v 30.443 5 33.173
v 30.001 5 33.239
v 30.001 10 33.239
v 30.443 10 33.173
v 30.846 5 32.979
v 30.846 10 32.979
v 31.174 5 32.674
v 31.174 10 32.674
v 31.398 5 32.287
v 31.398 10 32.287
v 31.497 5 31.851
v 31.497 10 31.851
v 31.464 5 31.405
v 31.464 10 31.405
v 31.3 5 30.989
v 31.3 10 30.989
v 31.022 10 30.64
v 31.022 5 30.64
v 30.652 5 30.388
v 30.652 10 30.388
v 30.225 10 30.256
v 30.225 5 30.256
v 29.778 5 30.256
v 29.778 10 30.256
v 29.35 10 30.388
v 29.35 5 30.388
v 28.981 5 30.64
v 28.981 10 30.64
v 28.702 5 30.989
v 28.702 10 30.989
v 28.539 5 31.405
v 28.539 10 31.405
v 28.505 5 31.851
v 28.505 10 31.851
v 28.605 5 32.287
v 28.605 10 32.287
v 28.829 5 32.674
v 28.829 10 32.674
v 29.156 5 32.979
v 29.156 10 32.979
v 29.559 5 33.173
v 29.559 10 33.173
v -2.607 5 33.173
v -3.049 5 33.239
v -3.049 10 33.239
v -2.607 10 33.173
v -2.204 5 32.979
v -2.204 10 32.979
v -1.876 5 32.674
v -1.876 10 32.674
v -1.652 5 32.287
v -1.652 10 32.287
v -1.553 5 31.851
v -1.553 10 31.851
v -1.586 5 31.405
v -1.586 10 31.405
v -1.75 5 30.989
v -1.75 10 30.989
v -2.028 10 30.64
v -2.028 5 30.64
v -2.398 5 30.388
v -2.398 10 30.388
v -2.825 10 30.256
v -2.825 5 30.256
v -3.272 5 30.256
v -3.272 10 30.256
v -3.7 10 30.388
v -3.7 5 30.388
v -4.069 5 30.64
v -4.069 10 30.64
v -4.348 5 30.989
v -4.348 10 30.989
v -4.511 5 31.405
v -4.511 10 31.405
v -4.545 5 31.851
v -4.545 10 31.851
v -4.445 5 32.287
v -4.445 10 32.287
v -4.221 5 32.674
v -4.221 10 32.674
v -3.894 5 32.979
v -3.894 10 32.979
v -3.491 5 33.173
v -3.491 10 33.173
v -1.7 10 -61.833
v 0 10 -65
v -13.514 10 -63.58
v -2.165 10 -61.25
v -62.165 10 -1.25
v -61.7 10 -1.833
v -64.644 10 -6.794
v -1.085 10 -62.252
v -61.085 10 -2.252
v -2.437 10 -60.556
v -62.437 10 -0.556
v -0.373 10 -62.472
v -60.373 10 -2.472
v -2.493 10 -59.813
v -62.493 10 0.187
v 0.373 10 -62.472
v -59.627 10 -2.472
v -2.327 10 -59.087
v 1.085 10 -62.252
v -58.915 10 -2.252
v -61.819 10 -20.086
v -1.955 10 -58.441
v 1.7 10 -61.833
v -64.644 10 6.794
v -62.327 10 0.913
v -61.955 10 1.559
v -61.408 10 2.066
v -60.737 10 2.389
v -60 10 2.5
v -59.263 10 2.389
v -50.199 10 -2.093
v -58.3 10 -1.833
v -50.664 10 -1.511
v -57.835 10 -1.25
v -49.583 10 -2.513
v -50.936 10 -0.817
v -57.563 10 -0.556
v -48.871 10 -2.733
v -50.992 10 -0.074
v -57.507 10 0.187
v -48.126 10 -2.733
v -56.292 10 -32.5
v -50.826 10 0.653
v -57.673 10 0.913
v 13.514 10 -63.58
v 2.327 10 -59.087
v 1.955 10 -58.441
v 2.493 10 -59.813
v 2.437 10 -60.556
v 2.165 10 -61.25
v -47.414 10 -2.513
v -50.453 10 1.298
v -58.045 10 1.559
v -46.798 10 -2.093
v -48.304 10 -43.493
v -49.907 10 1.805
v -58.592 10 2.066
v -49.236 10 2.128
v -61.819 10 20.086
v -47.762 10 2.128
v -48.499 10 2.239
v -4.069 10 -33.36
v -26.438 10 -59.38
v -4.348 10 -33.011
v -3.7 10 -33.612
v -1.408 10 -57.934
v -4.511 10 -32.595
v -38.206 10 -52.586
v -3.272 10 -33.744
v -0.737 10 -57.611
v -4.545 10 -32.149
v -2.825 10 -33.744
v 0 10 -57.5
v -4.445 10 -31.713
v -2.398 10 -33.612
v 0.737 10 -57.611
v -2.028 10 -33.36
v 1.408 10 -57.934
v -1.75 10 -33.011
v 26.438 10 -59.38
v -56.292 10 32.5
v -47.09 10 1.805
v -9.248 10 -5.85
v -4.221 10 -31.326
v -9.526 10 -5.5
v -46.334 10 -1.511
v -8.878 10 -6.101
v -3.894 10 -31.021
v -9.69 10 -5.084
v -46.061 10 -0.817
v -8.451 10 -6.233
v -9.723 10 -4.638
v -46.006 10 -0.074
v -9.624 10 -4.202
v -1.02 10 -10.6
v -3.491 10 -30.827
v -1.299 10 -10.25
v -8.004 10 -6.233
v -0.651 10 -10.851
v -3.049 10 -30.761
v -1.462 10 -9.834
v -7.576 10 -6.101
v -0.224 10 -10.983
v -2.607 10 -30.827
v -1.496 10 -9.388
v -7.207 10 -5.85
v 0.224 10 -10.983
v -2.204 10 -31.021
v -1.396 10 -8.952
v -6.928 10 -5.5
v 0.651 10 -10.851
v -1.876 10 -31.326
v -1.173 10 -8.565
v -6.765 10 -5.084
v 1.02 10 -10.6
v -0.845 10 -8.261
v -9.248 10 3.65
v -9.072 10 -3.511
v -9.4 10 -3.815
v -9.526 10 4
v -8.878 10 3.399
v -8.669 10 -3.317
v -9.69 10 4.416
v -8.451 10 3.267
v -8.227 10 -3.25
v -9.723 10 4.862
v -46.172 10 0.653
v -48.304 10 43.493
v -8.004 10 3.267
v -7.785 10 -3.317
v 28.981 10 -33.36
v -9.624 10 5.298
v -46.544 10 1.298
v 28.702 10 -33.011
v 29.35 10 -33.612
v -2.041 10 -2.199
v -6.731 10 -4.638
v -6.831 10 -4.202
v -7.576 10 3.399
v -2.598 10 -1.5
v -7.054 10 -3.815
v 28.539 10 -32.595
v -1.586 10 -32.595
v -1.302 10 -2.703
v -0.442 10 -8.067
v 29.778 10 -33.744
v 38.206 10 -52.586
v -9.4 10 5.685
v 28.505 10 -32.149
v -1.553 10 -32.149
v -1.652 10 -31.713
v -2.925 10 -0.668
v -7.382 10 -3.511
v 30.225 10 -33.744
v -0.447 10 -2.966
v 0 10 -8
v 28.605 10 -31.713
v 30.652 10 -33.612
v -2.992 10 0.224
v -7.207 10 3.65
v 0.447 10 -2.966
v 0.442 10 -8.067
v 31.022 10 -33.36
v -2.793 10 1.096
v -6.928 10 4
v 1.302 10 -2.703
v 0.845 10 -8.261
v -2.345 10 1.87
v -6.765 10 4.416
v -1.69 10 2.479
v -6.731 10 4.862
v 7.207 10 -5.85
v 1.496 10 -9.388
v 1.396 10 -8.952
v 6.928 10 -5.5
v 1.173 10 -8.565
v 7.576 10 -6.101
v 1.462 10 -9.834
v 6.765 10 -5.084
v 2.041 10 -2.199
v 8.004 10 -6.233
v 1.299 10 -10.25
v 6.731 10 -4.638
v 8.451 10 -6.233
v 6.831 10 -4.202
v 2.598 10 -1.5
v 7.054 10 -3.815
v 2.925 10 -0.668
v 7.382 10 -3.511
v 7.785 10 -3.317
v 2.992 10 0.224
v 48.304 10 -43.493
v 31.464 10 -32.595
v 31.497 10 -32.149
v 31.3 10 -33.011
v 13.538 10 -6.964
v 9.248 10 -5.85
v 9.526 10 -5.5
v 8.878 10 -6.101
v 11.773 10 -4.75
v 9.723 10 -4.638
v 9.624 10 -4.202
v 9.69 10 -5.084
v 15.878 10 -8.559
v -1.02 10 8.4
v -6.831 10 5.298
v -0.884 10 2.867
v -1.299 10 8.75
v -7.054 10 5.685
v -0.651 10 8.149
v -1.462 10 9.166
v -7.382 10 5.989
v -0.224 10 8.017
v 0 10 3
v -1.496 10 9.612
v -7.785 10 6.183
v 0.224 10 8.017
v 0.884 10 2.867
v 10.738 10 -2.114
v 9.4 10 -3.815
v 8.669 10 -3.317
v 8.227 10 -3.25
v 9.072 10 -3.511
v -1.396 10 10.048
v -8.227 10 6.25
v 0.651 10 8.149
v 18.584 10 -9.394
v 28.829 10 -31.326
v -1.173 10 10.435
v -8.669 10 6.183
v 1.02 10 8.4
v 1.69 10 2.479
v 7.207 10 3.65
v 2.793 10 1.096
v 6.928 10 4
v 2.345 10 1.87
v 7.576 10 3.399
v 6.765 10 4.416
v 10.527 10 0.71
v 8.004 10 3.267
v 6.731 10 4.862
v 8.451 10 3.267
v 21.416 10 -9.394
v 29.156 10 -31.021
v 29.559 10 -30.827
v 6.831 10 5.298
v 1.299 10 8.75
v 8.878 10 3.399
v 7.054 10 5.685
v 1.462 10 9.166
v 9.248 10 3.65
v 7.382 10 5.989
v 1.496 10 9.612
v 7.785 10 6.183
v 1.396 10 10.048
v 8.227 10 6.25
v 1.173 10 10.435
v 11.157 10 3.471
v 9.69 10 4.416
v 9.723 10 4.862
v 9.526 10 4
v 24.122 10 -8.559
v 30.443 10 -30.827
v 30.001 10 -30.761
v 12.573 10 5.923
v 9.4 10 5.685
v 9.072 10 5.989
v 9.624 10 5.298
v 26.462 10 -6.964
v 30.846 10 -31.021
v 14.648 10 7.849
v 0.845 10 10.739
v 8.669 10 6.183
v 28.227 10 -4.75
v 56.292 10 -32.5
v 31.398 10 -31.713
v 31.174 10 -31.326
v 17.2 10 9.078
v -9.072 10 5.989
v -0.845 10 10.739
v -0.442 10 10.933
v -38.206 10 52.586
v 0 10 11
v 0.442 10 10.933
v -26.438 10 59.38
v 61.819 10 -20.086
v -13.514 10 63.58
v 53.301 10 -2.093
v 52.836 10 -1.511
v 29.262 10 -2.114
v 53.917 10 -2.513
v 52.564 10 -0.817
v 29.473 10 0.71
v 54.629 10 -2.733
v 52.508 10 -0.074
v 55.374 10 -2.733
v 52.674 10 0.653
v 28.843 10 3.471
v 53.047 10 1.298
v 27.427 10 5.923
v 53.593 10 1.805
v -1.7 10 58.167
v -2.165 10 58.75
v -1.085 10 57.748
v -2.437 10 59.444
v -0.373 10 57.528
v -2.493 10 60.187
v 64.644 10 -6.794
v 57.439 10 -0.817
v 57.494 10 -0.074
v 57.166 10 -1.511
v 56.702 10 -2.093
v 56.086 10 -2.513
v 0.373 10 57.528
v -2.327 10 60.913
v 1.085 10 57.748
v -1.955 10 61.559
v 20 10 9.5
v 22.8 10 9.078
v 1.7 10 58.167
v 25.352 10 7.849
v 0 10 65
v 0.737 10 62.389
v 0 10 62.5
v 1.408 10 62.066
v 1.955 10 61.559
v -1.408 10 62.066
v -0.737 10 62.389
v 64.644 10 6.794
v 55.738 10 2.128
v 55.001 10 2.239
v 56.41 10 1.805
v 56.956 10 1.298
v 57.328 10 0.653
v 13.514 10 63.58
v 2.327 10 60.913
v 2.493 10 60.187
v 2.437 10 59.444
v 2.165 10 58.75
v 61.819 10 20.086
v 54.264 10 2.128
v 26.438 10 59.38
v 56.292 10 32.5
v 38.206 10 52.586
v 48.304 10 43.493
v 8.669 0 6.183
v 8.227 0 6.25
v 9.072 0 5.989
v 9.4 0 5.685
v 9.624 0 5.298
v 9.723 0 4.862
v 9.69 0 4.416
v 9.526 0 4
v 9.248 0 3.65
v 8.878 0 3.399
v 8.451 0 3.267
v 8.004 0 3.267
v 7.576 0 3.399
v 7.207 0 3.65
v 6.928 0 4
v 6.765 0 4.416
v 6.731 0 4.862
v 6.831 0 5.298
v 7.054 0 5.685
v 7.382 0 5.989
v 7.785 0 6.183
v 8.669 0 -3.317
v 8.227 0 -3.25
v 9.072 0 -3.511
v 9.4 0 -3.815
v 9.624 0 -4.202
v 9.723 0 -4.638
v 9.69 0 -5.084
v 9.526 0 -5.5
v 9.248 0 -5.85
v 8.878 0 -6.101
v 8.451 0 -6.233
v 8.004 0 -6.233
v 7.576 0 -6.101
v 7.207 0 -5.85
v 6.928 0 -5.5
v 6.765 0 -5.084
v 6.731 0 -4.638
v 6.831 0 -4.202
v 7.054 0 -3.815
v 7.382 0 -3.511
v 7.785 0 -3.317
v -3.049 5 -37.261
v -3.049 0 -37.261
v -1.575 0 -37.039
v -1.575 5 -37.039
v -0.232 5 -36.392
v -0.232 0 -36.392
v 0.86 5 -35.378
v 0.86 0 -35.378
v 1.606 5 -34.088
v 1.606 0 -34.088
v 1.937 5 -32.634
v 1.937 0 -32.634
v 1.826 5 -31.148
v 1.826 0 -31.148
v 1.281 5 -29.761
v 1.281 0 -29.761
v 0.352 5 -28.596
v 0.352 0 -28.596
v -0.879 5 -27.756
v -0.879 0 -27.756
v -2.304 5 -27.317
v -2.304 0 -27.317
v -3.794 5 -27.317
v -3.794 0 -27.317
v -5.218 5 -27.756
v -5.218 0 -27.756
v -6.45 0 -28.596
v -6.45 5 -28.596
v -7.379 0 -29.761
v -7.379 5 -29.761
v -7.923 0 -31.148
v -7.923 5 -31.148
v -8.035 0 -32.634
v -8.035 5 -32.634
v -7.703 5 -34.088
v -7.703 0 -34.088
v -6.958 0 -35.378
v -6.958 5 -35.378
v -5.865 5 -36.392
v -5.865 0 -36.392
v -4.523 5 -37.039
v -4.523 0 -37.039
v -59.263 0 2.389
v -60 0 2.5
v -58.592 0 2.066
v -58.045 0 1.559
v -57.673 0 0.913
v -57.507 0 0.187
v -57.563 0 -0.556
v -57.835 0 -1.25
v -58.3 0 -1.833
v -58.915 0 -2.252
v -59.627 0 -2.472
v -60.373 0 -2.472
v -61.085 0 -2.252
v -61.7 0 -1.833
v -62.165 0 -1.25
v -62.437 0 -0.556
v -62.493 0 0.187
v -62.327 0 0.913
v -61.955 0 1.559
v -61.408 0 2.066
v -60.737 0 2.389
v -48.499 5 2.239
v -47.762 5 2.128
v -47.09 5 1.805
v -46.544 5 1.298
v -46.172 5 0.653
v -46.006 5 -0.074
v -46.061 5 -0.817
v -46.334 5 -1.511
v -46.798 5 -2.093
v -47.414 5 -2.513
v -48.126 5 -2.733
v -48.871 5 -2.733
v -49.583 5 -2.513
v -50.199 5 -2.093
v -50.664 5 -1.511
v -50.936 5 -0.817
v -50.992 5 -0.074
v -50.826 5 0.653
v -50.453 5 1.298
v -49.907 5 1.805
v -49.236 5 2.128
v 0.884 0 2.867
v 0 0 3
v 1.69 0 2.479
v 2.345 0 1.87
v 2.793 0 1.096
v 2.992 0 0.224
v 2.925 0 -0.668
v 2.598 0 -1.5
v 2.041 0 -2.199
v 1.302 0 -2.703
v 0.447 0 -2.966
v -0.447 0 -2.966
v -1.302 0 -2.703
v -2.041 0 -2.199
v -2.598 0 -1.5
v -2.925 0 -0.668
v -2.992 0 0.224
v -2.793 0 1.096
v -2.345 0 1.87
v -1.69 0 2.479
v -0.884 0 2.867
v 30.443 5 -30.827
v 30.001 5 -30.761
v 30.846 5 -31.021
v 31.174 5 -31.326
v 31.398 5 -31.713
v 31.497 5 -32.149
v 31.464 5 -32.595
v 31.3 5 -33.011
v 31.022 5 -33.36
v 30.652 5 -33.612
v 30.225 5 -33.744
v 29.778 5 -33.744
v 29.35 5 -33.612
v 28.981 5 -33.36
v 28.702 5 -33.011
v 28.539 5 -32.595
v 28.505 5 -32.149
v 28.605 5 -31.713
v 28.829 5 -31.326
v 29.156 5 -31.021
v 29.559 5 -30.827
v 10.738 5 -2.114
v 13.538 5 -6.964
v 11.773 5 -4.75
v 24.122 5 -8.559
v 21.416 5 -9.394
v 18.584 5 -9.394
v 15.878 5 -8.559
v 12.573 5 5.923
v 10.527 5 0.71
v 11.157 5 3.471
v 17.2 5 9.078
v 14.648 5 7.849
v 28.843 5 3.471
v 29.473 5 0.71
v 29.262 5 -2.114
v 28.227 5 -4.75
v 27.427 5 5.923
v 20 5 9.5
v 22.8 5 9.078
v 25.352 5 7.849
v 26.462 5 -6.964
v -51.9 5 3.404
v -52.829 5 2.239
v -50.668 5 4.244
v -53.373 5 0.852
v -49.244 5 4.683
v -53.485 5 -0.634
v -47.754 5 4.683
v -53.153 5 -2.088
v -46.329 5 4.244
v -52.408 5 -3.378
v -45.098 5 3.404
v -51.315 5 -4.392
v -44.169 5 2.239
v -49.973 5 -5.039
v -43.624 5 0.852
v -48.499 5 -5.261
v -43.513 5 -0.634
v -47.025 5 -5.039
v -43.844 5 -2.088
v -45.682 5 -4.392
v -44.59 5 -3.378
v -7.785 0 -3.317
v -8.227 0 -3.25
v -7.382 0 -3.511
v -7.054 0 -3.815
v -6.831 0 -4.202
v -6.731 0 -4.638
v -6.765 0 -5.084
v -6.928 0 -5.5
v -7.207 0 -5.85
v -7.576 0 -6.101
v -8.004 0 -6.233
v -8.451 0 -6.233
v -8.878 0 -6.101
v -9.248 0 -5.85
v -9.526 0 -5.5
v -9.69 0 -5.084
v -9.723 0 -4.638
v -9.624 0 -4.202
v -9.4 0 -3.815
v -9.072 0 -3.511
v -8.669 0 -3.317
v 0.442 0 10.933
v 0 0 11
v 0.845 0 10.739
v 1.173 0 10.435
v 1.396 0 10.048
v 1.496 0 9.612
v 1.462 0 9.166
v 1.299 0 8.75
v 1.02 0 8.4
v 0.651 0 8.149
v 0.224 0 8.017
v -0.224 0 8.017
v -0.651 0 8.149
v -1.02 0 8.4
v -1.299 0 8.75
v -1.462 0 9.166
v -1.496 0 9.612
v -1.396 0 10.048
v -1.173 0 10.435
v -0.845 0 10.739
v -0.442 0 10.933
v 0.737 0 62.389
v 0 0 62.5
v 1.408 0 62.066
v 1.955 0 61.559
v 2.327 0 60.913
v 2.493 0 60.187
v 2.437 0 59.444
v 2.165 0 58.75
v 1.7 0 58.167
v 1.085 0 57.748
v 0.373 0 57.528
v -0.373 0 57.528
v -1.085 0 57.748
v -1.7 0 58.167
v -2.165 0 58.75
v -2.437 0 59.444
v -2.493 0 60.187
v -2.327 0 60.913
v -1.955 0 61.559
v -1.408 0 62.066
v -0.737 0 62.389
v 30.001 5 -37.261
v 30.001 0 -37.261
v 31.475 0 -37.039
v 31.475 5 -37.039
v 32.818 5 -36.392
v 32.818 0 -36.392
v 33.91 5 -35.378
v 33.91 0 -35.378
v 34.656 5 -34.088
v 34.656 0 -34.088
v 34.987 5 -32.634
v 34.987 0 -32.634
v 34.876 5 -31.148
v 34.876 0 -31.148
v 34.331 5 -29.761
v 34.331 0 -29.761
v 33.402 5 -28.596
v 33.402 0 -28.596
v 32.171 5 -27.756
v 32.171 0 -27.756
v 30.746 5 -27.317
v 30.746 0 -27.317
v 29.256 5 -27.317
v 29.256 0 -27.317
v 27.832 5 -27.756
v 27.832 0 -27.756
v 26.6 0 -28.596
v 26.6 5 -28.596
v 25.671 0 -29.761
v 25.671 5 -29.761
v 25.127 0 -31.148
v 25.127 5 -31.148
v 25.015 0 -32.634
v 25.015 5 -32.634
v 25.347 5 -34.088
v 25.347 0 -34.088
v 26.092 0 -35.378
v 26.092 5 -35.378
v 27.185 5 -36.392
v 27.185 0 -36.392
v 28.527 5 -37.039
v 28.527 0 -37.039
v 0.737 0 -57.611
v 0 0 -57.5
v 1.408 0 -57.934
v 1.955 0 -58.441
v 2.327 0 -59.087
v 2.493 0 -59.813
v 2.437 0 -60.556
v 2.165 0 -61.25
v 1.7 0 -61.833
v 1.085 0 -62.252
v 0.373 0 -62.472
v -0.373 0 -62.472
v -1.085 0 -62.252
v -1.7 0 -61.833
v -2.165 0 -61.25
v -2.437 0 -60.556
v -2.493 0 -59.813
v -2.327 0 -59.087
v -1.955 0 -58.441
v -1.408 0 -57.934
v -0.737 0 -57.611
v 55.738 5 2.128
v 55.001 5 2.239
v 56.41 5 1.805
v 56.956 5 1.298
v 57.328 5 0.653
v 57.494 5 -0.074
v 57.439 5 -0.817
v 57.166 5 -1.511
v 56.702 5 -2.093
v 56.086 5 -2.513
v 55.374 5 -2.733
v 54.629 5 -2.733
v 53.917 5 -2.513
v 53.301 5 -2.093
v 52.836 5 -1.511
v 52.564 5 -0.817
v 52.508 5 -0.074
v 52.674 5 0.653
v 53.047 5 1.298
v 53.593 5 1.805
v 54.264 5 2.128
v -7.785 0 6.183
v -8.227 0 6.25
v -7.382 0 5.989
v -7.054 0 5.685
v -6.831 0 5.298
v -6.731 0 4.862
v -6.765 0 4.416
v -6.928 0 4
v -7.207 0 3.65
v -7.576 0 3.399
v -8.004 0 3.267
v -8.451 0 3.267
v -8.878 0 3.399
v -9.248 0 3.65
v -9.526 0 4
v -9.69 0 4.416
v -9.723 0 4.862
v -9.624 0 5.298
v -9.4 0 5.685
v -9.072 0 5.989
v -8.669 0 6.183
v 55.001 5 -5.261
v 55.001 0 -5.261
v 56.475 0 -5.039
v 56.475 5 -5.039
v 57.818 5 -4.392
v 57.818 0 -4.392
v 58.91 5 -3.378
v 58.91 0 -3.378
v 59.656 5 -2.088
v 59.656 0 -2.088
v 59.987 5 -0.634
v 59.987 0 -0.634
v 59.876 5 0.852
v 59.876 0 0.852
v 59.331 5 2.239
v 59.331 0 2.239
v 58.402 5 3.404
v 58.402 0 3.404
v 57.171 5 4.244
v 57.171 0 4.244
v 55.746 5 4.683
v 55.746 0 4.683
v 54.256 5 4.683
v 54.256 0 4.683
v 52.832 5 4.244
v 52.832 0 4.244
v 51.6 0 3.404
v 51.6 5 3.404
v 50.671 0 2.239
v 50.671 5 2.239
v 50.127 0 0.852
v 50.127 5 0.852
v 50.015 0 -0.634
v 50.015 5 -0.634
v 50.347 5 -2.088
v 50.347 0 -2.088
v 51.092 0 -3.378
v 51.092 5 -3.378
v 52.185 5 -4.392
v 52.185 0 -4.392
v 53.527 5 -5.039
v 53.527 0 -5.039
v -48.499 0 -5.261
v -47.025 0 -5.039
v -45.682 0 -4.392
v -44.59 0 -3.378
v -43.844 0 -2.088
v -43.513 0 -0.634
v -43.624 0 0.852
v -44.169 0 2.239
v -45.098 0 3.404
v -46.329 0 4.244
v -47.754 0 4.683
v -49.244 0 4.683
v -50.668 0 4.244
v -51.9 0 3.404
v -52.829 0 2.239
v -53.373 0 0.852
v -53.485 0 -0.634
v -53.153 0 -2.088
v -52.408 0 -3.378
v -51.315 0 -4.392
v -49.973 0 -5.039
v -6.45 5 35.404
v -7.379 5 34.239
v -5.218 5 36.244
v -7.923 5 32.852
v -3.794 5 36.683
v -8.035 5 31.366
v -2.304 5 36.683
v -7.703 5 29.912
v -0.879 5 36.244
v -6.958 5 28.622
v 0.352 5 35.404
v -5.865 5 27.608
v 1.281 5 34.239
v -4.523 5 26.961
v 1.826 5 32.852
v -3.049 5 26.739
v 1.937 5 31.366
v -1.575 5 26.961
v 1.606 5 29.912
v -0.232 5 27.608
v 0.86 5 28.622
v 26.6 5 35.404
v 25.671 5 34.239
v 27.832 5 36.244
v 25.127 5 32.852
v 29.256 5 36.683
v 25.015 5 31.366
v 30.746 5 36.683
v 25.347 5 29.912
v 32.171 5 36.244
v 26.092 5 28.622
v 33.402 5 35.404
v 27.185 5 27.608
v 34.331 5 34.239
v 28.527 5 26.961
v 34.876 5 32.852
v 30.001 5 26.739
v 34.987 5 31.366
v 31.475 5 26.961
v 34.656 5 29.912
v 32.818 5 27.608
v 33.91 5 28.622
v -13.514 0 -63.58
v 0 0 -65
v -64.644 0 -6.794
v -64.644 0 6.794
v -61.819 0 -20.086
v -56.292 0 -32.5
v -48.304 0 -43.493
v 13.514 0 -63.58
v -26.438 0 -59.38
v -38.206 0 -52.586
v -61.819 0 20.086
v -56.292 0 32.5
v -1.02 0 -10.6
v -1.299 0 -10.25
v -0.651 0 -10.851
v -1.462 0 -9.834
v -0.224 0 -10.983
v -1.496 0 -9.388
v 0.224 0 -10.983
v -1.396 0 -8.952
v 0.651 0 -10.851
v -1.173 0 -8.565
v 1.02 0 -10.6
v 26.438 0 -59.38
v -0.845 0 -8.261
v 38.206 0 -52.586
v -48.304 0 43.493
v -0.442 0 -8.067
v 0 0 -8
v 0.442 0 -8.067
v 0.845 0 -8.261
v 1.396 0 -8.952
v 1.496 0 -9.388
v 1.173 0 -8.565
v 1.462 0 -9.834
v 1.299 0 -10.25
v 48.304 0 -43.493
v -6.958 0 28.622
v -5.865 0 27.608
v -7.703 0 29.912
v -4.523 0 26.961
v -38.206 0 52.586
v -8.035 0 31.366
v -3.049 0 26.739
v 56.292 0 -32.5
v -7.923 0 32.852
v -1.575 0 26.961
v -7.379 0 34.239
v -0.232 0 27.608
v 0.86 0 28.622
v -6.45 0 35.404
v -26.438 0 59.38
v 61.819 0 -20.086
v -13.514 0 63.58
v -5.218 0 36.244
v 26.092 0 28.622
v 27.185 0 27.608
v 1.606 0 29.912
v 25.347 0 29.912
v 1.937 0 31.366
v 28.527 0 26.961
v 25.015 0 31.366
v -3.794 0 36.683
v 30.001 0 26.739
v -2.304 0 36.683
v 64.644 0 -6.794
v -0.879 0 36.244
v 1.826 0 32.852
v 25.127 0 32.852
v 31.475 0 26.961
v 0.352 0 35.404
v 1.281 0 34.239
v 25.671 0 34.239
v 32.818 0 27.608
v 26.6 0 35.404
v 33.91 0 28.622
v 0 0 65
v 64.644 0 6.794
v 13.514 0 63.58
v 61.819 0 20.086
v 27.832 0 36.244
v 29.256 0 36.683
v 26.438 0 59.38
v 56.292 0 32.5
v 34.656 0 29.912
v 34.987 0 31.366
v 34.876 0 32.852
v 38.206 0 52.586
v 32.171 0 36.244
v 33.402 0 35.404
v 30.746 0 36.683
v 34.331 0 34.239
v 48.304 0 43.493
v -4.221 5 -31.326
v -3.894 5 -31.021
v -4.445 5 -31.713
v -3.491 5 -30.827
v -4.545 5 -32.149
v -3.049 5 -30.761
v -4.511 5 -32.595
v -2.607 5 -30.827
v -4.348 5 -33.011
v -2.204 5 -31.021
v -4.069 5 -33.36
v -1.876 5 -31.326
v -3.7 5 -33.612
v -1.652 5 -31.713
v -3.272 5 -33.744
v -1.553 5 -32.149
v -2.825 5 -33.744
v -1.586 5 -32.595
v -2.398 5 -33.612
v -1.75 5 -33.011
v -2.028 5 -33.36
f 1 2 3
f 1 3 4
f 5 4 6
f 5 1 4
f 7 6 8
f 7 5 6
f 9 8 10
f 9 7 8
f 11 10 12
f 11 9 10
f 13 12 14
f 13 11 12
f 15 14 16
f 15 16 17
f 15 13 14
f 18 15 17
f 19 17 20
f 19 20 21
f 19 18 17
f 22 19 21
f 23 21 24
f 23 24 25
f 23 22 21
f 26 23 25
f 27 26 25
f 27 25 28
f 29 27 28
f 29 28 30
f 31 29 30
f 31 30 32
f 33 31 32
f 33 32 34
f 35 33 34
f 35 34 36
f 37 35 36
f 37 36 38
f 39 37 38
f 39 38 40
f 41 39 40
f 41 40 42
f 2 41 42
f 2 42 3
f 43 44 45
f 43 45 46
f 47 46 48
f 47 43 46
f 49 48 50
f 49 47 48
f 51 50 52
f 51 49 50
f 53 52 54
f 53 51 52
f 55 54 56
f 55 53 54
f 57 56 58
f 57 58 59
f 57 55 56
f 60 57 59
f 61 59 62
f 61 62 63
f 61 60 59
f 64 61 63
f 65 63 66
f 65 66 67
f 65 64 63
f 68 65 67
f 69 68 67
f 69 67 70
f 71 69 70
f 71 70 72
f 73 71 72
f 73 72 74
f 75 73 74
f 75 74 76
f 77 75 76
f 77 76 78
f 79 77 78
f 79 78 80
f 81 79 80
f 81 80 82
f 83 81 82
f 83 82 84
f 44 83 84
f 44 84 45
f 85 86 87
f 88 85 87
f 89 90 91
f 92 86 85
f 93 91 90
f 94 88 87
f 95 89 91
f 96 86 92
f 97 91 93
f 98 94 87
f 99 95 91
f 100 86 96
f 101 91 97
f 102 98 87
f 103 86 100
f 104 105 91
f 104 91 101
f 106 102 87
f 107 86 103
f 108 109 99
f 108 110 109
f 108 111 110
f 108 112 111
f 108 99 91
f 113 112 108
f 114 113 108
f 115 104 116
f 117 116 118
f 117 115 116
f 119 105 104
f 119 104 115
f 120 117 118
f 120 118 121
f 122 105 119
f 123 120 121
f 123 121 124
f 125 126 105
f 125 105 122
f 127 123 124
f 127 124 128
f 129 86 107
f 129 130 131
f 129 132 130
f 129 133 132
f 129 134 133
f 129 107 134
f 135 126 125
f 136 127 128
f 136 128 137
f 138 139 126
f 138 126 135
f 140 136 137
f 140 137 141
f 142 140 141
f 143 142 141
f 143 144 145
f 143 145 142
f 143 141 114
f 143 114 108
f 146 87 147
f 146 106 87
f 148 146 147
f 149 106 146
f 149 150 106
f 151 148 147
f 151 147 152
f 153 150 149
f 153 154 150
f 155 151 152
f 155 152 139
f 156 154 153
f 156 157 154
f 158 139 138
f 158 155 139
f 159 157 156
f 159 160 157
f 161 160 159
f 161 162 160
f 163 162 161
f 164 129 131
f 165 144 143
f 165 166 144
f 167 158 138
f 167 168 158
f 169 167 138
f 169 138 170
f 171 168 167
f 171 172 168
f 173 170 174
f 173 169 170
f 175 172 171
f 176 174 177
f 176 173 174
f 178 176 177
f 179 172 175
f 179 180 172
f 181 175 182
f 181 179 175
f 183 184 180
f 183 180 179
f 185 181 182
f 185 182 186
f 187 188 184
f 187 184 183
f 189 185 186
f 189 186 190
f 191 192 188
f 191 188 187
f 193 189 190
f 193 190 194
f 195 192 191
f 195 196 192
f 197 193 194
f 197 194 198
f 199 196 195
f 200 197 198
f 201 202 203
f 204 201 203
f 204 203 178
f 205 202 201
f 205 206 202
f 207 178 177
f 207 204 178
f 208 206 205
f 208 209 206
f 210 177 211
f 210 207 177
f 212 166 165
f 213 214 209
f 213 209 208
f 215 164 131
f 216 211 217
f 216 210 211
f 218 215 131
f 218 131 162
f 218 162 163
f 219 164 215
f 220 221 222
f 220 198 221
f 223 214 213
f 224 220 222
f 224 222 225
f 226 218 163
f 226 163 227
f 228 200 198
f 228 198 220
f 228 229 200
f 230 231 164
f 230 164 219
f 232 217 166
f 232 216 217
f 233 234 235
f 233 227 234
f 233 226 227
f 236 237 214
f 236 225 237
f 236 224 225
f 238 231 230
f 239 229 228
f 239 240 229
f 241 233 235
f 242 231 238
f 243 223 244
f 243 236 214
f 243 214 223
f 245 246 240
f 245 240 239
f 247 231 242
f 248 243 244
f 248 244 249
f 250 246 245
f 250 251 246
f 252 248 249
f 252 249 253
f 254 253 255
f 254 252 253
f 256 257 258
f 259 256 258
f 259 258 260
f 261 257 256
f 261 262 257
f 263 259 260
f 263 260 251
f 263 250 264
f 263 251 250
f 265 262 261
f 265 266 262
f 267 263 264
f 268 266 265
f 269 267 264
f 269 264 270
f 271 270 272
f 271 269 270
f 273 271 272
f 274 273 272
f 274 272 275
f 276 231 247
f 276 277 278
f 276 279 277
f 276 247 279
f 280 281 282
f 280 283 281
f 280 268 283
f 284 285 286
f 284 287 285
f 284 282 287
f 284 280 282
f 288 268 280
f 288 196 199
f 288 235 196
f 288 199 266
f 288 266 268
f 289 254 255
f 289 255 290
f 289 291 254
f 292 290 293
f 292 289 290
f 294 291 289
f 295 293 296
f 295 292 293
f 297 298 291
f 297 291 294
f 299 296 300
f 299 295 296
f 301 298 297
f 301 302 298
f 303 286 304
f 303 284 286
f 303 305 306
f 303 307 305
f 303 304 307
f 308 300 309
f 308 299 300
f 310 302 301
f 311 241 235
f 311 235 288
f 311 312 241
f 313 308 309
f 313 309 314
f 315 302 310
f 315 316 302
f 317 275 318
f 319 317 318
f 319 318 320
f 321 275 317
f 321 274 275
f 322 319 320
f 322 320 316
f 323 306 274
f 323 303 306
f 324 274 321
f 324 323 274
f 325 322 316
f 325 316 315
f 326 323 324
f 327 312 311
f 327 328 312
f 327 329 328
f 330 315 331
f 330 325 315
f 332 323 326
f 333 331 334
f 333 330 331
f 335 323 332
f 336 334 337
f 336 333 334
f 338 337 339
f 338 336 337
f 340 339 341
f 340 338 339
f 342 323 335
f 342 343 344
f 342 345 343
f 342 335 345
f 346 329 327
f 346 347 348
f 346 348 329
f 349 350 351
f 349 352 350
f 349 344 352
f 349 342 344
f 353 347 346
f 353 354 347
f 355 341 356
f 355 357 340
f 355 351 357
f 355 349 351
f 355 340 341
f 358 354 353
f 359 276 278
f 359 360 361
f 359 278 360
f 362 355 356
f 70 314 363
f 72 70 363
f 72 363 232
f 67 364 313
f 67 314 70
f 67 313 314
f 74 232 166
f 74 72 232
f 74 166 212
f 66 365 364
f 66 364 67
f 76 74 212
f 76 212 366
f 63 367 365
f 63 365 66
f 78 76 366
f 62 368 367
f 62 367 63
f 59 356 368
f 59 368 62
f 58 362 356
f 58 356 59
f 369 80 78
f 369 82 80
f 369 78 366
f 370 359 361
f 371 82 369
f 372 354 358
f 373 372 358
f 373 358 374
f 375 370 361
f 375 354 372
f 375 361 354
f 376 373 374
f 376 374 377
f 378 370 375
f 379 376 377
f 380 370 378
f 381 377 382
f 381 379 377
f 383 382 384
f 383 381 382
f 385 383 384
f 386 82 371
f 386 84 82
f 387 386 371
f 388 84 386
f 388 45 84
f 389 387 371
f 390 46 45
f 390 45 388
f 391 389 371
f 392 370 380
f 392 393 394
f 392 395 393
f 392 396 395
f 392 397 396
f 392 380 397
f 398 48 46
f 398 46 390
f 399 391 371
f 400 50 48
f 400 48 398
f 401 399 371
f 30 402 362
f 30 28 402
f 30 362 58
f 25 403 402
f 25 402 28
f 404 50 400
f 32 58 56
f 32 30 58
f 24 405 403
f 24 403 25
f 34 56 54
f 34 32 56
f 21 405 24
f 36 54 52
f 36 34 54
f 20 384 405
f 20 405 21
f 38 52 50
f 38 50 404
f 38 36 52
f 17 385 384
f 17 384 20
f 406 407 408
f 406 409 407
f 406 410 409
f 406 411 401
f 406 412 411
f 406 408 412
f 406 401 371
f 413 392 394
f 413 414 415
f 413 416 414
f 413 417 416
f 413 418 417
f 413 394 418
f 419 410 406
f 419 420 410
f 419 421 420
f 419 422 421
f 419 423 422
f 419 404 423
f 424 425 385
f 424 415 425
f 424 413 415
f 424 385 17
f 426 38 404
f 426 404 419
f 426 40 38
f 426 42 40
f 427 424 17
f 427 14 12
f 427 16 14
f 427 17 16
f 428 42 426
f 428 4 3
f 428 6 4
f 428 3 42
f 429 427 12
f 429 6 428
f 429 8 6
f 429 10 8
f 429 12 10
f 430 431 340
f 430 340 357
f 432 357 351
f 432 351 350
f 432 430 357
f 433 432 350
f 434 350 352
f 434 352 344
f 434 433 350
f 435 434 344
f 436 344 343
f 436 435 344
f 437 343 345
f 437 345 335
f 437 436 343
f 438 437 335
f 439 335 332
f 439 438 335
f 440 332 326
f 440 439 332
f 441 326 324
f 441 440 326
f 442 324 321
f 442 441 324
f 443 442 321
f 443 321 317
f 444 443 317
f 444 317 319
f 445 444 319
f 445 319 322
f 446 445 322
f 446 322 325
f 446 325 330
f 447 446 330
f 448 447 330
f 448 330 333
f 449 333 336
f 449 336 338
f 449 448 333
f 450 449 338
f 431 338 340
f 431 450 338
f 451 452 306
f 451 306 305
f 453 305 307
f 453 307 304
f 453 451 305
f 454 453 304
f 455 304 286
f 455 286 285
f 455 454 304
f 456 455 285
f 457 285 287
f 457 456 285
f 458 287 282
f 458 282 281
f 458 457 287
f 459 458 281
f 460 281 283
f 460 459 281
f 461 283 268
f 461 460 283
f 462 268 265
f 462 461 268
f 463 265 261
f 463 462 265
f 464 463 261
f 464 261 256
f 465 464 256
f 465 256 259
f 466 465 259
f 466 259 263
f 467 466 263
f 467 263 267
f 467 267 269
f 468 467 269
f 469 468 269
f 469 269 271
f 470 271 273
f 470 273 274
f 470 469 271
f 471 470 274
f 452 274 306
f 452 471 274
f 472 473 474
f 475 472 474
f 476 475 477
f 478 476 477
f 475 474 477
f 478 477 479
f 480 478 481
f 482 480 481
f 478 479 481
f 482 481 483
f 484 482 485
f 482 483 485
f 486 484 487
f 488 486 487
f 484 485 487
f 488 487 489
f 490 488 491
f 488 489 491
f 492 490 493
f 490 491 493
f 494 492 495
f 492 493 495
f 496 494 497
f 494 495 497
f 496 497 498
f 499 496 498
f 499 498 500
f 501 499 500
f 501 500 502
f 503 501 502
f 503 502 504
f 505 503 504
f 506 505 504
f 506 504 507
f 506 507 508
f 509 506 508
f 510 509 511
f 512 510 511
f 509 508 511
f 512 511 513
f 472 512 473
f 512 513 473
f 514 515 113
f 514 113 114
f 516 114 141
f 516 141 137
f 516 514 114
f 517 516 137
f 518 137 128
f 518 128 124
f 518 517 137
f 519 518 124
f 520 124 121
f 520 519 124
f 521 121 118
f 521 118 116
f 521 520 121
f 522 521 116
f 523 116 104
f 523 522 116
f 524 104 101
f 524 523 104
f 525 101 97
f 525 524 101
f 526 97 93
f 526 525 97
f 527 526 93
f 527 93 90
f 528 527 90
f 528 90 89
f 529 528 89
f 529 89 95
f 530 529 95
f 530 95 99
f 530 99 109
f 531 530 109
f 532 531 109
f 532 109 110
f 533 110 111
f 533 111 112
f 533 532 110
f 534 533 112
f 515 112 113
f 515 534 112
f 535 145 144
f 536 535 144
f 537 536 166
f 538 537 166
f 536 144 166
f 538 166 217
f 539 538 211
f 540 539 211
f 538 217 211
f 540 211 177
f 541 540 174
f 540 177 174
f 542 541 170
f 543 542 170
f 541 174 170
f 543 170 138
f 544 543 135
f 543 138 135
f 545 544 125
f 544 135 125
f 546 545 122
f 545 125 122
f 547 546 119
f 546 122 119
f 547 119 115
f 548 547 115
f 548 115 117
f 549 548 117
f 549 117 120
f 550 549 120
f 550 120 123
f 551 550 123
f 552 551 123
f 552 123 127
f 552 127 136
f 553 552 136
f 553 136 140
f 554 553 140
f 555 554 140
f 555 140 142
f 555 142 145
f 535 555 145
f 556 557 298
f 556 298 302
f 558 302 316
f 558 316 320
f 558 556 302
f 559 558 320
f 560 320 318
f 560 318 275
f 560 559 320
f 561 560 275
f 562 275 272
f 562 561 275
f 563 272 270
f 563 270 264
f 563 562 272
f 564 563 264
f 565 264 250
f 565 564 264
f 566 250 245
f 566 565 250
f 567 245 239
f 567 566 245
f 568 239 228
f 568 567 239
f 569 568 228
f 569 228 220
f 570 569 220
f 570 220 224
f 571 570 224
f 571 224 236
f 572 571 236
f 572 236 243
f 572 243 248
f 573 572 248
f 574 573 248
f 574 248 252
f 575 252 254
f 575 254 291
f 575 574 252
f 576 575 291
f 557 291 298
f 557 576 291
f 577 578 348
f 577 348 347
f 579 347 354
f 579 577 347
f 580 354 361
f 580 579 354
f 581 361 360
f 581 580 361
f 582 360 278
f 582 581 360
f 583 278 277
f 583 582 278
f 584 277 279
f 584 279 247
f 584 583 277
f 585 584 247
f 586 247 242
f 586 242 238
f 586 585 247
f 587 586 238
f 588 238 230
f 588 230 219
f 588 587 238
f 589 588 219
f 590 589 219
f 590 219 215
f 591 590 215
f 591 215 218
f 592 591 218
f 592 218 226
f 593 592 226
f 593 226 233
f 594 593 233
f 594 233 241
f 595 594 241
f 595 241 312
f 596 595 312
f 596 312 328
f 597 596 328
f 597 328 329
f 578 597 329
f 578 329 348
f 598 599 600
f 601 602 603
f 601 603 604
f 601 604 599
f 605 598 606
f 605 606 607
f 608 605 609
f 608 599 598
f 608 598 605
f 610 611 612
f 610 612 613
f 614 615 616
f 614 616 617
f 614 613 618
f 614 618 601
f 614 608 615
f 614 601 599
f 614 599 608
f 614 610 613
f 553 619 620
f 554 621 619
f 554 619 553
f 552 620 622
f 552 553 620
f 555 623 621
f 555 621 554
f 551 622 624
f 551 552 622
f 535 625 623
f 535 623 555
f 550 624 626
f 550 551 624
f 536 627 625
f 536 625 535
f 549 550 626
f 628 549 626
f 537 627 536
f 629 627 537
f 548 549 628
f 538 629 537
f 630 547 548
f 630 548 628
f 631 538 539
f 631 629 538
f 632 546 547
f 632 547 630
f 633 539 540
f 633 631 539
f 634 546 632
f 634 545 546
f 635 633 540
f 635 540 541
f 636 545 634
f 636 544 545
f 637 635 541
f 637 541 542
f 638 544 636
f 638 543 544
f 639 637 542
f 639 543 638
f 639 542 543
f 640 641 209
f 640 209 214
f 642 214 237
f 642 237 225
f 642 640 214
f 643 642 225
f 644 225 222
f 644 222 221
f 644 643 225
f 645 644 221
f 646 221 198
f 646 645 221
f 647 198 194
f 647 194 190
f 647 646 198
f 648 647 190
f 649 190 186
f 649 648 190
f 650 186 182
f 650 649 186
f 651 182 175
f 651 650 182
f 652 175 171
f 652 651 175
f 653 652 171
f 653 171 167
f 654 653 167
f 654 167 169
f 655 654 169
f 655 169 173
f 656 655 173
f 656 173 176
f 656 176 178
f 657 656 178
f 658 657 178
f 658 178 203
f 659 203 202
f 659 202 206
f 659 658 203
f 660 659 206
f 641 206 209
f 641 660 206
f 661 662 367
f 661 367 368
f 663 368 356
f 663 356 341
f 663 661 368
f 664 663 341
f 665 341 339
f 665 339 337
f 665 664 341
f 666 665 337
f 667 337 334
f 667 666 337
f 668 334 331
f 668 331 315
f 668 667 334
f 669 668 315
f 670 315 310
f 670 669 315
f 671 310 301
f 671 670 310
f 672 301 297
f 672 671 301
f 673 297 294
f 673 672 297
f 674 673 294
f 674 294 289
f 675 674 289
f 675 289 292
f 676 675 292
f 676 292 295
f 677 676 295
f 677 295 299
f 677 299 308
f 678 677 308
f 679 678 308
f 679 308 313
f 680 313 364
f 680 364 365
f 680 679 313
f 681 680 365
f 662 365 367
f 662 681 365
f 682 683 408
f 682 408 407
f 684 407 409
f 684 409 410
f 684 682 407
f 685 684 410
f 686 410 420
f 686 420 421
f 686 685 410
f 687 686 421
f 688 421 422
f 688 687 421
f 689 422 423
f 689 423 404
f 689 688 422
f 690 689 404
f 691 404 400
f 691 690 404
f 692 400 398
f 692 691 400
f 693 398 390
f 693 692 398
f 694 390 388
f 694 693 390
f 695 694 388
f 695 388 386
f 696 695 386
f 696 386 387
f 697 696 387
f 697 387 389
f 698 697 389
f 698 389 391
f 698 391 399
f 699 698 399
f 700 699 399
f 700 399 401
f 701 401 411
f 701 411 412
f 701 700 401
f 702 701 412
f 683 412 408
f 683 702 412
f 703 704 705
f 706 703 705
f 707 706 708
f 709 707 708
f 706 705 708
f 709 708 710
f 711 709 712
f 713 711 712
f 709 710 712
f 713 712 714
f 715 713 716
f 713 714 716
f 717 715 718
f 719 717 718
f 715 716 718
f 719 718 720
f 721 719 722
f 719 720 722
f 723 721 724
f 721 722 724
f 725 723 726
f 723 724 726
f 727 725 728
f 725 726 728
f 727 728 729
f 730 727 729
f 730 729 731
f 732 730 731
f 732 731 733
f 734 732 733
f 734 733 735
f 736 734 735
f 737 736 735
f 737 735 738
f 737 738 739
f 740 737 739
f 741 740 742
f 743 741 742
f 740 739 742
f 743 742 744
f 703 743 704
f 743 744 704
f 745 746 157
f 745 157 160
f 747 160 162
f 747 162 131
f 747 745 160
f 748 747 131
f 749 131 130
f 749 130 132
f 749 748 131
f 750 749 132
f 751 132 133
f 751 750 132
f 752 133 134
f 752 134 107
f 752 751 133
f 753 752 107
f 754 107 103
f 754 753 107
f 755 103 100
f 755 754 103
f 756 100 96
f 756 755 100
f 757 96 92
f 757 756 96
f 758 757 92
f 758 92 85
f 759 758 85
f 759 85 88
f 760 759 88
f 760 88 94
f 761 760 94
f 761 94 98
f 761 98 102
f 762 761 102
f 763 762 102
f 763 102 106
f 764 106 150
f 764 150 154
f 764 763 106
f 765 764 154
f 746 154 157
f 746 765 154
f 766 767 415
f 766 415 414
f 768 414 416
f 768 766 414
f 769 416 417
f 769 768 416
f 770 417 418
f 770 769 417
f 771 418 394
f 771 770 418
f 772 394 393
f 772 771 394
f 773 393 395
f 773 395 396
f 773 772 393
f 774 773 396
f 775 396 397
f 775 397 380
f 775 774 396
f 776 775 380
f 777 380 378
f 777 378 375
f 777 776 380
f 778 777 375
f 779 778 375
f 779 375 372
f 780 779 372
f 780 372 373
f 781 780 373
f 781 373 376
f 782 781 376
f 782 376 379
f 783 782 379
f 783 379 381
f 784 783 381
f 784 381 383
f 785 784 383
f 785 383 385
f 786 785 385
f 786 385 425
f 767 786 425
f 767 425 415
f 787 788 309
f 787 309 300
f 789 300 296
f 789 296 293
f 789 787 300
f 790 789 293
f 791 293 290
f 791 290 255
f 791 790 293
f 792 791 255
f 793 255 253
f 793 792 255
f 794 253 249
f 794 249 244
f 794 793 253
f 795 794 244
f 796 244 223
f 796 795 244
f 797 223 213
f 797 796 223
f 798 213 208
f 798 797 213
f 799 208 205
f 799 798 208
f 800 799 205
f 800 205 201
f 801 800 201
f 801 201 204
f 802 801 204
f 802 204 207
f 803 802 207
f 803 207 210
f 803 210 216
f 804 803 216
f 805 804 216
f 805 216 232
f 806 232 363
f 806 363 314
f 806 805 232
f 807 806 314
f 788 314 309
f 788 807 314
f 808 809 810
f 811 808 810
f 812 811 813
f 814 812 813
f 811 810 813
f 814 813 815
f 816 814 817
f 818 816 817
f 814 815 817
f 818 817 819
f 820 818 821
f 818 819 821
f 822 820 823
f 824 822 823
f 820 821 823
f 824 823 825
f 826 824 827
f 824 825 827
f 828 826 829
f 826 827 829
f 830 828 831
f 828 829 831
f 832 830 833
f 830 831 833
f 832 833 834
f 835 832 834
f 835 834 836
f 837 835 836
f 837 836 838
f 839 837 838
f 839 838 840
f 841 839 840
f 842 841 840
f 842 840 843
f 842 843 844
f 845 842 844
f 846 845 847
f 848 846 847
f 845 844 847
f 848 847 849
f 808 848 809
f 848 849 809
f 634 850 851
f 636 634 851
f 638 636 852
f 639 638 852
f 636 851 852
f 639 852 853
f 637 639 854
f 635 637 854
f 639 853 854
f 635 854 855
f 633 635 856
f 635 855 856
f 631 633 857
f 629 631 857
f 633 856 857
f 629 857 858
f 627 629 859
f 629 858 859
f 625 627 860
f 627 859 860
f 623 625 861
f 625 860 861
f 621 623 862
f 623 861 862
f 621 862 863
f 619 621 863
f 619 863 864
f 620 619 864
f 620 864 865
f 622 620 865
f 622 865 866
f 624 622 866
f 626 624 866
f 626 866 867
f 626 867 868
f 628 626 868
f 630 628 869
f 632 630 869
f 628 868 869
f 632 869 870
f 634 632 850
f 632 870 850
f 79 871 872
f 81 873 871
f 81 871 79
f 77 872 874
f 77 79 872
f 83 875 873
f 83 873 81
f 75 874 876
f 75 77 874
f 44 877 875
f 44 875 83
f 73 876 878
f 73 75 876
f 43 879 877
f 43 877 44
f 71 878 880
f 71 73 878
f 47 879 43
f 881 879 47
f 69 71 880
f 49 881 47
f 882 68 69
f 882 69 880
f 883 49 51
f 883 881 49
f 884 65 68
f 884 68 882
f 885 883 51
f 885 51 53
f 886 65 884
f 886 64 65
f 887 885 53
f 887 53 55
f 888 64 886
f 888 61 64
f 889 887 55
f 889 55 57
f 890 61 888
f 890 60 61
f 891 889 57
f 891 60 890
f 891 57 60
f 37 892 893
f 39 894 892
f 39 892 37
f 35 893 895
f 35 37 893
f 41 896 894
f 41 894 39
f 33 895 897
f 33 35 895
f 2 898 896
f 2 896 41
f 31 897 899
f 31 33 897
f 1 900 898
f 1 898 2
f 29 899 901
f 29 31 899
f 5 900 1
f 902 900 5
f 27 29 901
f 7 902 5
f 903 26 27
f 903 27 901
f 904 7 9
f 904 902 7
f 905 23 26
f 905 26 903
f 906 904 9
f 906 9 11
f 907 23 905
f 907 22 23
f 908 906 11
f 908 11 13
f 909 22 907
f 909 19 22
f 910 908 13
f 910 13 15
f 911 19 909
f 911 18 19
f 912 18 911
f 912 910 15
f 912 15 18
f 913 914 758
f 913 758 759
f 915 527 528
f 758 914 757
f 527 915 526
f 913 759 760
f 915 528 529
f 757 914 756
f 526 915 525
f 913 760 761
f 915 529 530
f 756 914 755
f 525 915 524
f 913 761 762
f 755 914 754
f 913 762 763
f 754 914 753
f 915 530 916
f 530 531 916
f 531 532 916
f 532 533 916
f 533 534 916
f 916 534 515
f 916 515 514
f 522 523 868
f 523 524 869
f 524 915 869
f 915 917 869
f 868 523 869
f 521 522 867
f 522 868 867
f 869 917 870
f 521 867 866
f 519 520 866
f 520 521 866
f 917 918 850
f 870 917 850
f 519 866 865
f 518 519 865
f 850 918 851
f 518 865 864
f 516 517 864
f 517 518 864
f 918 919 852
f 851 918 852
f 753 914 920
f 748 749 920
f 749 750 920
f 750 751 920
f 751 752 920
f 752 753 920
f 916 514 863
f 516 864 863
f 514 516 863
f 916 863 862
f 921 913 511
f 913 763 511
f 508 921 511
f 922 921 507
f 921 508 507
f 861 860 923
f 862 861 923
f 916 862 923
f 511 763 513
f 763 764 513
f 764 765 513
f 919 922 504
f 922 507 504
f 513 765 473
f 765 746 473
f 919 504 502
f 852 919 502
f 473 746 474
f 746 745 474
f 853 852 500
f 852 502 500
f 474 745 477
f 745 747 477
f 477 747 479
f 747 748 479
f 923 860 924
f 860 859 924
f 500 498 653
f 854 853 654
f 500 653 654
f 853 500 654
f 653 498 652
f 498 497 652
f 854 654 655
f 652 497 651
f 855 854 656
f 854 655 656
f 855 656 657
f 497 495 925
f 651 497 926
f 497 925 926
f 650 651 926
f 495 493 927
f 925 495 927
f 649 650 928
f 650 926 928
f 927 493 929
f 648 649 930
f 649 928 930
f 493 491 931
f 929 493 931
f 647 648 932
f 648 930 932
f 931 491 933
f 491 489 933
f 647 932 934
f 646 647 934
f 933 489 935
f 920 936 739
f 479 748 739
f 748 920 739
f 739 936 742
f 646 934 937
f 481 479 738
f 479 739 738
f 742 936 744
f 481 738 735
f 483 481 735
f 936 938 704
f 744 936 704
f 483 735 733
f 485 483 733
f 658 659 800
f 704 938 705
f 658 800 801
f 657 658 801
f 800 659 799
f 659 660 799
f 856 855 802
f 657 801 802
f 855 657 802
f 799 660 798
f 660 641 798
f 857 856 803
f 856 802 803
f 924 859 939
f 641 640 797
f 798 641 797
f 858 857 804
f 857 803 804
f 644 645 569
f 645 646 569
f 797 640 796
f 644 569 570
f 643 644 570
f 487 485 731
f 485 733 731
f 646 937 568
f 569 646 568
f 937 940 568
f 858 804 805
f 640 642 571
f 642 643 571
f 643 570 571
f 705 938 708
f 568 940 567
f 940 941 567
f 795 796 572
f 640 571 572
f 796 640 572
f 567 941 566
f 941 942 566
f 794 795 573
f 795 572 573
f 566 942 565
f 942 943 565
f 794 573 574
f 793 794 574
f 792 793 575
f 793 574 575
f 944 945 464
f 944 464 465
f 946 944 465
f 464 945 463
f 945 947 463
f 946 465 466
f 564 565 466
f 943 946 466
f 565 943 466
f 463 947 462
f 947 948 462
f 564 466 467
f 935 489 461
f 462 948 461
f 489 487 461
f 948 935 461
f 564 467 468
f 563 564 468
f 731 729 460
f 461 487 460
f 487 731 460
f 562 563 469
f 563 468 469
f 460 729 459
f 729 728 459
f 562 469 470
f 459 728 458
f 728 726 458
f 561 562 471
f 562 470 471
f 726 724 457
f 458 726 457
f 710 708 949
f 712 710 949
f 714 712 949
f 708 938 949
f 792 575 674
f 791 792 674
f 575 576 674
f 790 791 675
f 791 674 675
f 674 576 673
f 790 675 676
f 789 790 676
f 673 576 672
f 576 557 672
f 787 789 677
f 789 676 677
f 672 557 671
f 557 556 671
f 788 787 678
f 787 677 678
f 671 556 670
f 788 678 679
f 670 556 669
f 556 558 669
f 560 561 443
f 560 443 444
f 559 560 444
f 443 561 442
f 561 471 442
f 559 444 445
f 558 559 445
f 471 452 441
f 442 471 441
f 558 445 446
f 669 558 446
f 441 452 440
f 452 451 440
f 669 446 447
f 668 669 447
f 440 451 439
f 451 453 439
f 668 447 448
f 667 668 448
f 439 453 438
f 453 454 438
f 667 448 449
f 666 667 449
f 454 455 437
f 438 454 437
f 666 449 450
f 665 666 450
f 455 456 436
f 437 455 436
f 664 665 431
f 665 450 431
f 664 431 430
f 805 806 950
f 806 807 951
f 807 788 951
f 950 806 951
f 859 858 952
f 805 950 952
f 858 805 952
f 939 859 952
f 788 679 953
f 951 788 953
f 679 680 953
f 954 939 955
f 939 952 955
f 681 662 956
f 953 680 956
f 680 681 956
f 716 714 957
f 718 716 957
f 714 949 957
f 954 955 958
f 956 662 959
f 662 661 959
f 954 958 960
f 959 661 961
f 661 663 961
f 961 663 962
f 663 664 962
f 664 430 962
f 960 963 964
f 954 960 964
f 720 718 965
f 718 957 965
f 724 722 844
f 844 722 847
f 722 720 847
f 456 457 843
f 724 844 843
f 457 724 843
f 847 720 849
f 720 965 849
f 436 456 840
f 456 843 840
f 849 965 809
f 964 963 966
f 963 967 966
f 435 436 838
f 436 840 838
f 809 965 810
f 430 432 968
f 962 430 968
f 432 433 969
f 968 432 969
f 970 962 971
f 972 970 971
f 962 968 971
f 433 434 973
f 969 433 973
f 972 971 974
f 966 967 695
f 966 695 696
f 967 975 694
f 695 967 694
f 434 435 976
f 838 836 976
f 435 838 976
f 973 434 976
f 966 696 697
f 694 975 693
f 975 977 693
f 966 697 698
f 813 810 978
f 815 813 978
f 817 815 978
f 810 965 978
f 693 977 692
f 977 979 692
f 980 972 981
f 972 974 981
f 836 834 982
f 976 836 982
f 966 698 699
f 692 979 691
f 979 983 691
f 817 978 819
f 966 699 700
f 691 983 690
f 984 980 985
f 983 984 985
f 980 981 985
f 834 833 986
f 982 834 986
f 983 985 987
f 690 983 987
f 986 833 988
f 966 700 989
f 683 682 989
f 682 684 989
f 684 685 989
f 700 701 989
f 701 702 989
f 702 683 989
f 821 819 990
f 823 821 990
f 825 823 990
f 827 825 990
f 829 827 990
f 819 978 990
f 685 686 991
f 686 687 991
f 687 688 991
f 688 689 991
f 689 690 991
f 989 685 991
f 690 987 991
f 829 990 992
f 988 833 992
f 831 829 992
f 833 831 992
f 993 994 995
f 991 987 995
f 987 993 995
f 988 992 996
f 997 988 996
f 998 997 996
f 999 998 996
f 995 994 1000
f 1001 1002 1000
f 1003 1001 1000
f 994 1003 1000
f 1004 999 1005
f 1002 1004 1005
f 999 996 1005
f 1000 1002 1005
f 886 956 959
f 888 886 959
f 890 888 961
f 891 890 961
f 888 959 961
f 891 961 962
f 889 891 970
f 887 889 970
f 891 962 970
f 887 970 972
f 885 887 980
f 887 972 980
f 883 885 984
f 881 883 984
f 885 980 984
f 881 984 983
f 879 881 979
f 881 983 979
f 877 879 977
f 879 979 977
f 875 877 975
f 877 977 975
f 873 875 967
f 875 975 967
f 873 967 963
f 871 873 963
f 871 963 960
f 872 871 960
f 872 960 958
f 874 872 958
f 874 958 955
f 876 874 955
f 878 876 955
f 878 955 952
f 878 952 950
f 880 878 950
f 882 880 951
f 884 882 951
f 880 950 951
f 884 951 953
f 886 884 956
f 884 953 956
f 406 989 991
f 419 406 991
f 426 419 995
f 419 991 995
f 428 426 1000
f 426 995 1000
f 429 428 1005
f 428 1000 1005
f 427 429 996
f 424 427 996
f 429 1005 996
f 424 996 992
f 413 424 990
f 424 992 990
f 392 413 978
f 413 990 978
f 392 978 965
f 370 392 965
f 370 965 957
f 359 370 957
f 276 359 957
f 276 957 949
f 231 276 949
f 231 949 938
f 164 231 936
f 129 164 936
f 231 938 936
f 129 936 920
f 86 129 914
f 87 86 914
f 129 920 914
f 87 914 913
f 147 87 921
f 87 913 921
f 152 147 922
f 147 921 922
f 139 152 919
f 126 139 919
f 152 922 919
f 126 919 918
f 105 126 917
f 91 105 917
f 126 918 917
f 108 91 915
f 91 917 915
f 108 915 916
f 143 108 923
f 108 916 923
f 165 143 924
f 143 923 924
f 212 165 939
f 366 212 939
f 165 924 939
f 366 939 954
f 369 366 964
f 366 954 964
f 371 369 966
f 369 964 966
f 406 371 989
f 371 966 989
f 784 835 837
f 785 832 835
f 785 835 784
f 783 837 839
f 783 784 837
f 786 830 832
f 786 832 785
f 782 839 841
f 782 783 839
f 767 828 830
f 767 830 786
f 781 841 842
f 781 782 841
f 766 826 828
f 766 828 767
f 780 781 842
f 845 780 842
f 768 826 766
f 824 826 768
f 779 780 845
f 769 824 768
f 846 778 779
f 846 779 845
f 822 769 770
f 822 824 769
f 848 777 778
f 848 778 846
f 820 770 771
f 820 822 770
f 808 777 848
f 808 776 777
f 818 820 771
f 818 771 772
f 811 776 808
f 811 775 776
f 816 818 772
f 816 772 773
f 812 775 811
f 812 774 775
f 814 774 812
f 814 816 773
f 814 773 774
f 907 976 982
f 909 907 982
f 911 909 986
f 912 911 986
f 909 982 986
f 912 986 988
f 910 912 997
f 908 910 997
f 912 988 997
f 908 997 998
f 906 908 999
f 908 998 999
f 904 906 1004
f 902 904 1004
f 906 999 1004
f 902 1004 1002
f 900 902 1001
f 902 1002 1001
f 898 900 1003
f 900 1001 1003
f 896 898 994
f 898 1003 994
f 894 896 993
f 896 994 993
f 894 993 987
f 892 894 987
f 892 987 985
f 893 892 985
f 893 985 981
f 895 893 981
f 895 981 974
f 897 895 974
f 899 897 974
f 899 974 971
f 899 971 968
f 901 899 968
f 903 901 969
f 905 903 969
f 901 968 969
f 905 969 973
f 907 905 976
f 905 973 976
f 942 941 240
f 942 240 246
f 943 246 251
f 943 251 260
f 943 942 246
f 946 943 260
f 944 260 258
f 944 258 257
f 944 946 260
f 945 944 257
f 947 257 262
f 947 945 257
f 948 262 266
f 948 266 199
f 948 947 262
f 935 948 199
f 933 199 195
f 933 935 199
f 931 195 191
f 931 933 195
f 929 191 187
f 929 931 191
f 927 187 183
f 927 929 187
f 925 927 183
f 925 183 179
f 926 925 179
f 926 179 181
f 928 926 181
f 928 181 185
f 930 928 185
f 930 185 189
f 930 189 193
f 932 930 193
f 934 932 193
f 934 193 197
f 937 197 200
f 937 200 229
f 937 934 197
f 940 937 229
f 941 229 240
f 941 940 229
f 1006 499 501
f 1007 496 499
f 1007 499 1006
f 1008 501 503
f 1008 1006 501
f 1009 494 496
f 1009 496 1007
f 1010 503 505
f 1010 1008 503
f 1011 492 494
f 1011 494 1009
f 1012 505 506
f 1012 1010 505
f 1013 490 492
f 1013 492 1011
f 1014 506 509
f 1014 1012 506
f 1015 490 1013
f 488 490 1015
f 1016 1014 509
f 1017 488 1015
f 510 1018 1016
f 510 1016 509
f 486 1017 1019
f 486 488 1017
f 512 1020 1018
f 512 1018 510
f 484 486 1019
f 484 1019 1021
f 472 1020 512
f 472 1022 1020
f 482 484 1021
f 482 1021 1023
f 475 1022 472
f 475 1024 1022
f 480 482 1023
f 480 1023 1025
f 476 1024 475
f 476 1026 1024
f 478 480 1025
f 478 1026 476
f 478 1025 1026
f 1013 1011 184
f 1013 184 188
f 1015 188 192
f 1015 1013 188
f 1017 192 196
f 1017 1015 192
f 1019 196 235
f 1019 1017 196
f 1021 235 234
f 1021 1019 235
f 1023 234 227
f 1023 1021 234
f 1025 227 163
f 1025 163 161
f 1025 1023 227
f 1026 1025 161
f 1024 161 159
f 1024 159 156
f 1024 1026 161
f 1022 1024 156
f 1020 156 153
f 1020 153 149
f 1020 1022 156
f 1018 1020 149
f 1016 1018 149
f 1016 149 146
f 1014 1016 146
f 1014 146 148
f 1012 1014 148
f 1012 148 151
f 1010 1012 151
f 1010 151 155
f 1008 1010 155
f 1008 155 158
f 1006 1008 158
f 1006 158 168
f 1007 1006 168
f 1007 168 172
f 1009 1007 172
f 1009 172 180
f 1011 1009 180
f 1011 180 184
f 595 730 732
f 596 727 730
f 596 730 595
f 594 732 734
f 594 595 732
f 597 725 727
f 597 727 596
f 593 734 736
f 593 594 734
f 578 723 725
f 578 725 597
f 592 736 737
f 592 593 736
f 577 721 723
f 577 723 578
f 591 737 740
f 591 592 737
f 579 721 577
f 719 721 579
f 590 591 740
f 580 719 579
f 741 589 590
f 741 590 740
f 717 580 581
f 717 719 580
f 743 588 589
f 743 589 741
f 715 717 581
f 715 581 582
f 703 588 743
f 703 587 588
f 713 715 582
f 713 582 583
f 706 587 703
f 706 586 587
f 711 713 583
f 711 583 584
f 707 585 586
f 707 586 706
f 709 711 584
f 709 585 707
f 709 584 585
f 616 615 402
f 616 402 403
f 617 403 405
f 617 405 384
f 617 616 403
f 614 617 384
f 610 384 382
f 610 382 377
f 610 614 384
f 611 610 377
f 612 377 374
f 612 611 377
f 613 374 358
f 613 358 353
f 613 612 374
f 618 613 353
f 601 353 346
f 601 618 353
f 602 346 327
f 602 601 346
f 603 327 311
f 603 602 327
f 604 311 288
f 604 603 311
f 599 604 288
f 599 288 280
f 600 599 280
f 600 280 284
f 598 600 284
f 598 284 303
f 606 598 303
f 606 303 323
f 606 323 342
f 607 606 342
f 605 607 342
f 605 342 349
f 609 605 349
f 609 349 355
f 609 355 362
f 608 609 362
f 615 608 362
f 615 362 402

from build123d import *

# Parameters (mm, degrees)
SKETCH1_R           = 65
SKETCH1_R_2         = 3
SKETCH1_R_3         = 1.5
SKETCH1_R_4         = 2.5
SKETCH1_R_5         = 9.5
BOSS_EXTRUDE1_DEPTH = 10
SKETCH1_3_R         = 9.5
BOSS_EXTRUDE2_DEPTH = 5
SKETCH2_R           = 5
CUT_EXTRUDE1_DEPTH  = 5
SKETCH3_R           = 2.5
CUT_EXTRUDE2_DEPTH  = 10
SKETCH4_R           = 5
CUT_EXTRUDE3_DEPTH  = 5


with BuildPart() as part:
    # Sketch1 → Boss-Extrude1 (new body)
    with BuildSketch(Plane(origin=(0, 0, 0), x_dir=(1, 0, 0), z_dir=(0, 1, 0))):
        with Locations(Location((0, 0, 0), (0, 0, 270))):
            Circle(SKETCH1_R)
        with Locations(Location((0, 0, 0), (0, 0, 270))):
            Circle(SKETCH1_R_2, mode=Mode.SUBTRACT)
        with Locations(Location((0, 9.5, 0), (0, 0, 270))):
            Circle(SKETCH1_R_3, mode=Mode.SUBTRACT)
        with Locations(Location((8.227241336, 4.75, 0), (0, 0, 270))):
            Circle(SKETCH1_R_3, mode=Mode.SUBTRACT)
        with Locations(Location((8.227241336, -4.75, 0), (0, 0, 270))):
            Circle(SKETCH1_R_3, mode=Mode.SUBTRACT)
        with Locations(Location((0, -9.5, 0), (0, 0, 270))):
            Circle(SKETCH1_R_3, mode=Mode.SUBTRACT)
        with Locations(Location((-8.227241336, -4.75, 0), (0, 0, 270))):
            Circle(SKETCH1_R_3, mode=Mode.SUBTRACT)
        with Locations(Location((-8.227241336, 4.75, 0), (0, 0, 270))):
            Circle(SKETCH1_R_3, mode=Mode.SUBTRACT)
        with Locations(Location((0, -60, 0), (0, 0, 270))):
            Circle(SKETCH1_R_4, mode=Mode.SUBTRACT)
        with Locations(Location((-60, 0, 0), (0, 0, 270))):
            Circle(SKETCH1_R_4, mode=Mode.SUBTRACT)
        with Locations(Location((0, 60, 0), (0, 0, 270))):
            Circle(SKETCH1_R_4, mode=Mode.SUBTRACT)
        with Locations(Location((20, 0, 0), (0, 0, 270))):
            Circle(SKETCH1_R_5, mode=Mode.SUBTRACT)
        with Locations(Location((-3.048738704, 32.260845552, 0), (0, 0, 270))):
            Circle(SKETCH1_R_3, mode=Mode.SUBTRACT)
        with Locations(Location((30.001268663, 32.260845552, 0), (0, 0, 270))):
            Circle(SKETCH1_R_3, mode=Mode.SUBTRACT)
        with Locations(Location((55.001268663, 0.260845552, 0), (0, 0, 270))):
            Circle(SKETCH1_R_4, mode=Mode.SUBTRACT)
        with Locations(Location((30.001268663, -31.739154448, 0), (0, 0, 270))):
            Circle(SKETCH1_R_3, mode=Mode.SUBTRACT)
        with Locations(Location((-3.048738704, -31.739154448, 0), (0, 0, 270))):
            Circle(SKETCH1_R_3, mode=Mode.SUBTRACT)
    extrude(amount=BOSS_EXTRUDE1_DEPTH)

    # Sketch1<3> → Boss-Extrude2 (add)
    with BuildSketch(Plane(origin=(0, 0, 0), x_dir=(1, 0, 0), z_dir=(0, 1, 0))):
        with Locations(Location((20, 0, 0), (0, 0, 270))):
            Circle(SKETCH1_3_R)
    extrude(amount=BOSS_EXTRUDE2_DEPTH)

    # Sketch2 → Cut-Extrude1 (cut)
    with BuildSketch(Plane.XZ):
        with Locations(Location((30.001268663, 31.739154448, 0), (0, 0, 270))):
            Circle(SKETCH2_R)
        with Locations(Location((-3.048738704, 31.739154448, 0), (0, 0, 270))):
            Circle(SKETCH2_R)
        with Locations(Location((55.001268663, -0.260845552, 0), (0, 0, 270))):
            Circle(SKETCH2_R)
        with Locations(Location((30.001268663, -32.260845552, 0), (0, 0, 270))):
            Circle(SKETCH2_R)
        with Locations(Location((-3.048738704, -32.260845552, 0), (0, 0, 270))):
            Circle(SKETCH2_R)
    extrude(amount=-CUT_EXTRUDE1_DEPTH, mode=Mode.SUBTRACT)

    # Sketch3 → Cut-Extrude2 (cut)
    with BuildSketch(Plane(origin=(0, 10, 0), x_dir=(1, 0, 0), z_dir=(0, 1, 0))):
        with Locations(Location((-48.498731337, 0.260845552, 0), (0, 0, 270))):
            Circle(SKETCH3_R)
    extrude(amount=-CUT_EXTRUDE2_DEPTH, mode=Mode.SUBTRACT)

    # Sketch4 → Cut-Extrude3 (cut)
    with BuildSketch(Plane.XZ):
        with Locations(Location((-48.498731337, -0.260845552, 0), (0, 0, 270))):
            Circle(SKETCH4_R)
    extrude(amount=-CUT_EXTRUDE3_DEPTH, mode=Mode.SUBTRACT)


solid = part.part
